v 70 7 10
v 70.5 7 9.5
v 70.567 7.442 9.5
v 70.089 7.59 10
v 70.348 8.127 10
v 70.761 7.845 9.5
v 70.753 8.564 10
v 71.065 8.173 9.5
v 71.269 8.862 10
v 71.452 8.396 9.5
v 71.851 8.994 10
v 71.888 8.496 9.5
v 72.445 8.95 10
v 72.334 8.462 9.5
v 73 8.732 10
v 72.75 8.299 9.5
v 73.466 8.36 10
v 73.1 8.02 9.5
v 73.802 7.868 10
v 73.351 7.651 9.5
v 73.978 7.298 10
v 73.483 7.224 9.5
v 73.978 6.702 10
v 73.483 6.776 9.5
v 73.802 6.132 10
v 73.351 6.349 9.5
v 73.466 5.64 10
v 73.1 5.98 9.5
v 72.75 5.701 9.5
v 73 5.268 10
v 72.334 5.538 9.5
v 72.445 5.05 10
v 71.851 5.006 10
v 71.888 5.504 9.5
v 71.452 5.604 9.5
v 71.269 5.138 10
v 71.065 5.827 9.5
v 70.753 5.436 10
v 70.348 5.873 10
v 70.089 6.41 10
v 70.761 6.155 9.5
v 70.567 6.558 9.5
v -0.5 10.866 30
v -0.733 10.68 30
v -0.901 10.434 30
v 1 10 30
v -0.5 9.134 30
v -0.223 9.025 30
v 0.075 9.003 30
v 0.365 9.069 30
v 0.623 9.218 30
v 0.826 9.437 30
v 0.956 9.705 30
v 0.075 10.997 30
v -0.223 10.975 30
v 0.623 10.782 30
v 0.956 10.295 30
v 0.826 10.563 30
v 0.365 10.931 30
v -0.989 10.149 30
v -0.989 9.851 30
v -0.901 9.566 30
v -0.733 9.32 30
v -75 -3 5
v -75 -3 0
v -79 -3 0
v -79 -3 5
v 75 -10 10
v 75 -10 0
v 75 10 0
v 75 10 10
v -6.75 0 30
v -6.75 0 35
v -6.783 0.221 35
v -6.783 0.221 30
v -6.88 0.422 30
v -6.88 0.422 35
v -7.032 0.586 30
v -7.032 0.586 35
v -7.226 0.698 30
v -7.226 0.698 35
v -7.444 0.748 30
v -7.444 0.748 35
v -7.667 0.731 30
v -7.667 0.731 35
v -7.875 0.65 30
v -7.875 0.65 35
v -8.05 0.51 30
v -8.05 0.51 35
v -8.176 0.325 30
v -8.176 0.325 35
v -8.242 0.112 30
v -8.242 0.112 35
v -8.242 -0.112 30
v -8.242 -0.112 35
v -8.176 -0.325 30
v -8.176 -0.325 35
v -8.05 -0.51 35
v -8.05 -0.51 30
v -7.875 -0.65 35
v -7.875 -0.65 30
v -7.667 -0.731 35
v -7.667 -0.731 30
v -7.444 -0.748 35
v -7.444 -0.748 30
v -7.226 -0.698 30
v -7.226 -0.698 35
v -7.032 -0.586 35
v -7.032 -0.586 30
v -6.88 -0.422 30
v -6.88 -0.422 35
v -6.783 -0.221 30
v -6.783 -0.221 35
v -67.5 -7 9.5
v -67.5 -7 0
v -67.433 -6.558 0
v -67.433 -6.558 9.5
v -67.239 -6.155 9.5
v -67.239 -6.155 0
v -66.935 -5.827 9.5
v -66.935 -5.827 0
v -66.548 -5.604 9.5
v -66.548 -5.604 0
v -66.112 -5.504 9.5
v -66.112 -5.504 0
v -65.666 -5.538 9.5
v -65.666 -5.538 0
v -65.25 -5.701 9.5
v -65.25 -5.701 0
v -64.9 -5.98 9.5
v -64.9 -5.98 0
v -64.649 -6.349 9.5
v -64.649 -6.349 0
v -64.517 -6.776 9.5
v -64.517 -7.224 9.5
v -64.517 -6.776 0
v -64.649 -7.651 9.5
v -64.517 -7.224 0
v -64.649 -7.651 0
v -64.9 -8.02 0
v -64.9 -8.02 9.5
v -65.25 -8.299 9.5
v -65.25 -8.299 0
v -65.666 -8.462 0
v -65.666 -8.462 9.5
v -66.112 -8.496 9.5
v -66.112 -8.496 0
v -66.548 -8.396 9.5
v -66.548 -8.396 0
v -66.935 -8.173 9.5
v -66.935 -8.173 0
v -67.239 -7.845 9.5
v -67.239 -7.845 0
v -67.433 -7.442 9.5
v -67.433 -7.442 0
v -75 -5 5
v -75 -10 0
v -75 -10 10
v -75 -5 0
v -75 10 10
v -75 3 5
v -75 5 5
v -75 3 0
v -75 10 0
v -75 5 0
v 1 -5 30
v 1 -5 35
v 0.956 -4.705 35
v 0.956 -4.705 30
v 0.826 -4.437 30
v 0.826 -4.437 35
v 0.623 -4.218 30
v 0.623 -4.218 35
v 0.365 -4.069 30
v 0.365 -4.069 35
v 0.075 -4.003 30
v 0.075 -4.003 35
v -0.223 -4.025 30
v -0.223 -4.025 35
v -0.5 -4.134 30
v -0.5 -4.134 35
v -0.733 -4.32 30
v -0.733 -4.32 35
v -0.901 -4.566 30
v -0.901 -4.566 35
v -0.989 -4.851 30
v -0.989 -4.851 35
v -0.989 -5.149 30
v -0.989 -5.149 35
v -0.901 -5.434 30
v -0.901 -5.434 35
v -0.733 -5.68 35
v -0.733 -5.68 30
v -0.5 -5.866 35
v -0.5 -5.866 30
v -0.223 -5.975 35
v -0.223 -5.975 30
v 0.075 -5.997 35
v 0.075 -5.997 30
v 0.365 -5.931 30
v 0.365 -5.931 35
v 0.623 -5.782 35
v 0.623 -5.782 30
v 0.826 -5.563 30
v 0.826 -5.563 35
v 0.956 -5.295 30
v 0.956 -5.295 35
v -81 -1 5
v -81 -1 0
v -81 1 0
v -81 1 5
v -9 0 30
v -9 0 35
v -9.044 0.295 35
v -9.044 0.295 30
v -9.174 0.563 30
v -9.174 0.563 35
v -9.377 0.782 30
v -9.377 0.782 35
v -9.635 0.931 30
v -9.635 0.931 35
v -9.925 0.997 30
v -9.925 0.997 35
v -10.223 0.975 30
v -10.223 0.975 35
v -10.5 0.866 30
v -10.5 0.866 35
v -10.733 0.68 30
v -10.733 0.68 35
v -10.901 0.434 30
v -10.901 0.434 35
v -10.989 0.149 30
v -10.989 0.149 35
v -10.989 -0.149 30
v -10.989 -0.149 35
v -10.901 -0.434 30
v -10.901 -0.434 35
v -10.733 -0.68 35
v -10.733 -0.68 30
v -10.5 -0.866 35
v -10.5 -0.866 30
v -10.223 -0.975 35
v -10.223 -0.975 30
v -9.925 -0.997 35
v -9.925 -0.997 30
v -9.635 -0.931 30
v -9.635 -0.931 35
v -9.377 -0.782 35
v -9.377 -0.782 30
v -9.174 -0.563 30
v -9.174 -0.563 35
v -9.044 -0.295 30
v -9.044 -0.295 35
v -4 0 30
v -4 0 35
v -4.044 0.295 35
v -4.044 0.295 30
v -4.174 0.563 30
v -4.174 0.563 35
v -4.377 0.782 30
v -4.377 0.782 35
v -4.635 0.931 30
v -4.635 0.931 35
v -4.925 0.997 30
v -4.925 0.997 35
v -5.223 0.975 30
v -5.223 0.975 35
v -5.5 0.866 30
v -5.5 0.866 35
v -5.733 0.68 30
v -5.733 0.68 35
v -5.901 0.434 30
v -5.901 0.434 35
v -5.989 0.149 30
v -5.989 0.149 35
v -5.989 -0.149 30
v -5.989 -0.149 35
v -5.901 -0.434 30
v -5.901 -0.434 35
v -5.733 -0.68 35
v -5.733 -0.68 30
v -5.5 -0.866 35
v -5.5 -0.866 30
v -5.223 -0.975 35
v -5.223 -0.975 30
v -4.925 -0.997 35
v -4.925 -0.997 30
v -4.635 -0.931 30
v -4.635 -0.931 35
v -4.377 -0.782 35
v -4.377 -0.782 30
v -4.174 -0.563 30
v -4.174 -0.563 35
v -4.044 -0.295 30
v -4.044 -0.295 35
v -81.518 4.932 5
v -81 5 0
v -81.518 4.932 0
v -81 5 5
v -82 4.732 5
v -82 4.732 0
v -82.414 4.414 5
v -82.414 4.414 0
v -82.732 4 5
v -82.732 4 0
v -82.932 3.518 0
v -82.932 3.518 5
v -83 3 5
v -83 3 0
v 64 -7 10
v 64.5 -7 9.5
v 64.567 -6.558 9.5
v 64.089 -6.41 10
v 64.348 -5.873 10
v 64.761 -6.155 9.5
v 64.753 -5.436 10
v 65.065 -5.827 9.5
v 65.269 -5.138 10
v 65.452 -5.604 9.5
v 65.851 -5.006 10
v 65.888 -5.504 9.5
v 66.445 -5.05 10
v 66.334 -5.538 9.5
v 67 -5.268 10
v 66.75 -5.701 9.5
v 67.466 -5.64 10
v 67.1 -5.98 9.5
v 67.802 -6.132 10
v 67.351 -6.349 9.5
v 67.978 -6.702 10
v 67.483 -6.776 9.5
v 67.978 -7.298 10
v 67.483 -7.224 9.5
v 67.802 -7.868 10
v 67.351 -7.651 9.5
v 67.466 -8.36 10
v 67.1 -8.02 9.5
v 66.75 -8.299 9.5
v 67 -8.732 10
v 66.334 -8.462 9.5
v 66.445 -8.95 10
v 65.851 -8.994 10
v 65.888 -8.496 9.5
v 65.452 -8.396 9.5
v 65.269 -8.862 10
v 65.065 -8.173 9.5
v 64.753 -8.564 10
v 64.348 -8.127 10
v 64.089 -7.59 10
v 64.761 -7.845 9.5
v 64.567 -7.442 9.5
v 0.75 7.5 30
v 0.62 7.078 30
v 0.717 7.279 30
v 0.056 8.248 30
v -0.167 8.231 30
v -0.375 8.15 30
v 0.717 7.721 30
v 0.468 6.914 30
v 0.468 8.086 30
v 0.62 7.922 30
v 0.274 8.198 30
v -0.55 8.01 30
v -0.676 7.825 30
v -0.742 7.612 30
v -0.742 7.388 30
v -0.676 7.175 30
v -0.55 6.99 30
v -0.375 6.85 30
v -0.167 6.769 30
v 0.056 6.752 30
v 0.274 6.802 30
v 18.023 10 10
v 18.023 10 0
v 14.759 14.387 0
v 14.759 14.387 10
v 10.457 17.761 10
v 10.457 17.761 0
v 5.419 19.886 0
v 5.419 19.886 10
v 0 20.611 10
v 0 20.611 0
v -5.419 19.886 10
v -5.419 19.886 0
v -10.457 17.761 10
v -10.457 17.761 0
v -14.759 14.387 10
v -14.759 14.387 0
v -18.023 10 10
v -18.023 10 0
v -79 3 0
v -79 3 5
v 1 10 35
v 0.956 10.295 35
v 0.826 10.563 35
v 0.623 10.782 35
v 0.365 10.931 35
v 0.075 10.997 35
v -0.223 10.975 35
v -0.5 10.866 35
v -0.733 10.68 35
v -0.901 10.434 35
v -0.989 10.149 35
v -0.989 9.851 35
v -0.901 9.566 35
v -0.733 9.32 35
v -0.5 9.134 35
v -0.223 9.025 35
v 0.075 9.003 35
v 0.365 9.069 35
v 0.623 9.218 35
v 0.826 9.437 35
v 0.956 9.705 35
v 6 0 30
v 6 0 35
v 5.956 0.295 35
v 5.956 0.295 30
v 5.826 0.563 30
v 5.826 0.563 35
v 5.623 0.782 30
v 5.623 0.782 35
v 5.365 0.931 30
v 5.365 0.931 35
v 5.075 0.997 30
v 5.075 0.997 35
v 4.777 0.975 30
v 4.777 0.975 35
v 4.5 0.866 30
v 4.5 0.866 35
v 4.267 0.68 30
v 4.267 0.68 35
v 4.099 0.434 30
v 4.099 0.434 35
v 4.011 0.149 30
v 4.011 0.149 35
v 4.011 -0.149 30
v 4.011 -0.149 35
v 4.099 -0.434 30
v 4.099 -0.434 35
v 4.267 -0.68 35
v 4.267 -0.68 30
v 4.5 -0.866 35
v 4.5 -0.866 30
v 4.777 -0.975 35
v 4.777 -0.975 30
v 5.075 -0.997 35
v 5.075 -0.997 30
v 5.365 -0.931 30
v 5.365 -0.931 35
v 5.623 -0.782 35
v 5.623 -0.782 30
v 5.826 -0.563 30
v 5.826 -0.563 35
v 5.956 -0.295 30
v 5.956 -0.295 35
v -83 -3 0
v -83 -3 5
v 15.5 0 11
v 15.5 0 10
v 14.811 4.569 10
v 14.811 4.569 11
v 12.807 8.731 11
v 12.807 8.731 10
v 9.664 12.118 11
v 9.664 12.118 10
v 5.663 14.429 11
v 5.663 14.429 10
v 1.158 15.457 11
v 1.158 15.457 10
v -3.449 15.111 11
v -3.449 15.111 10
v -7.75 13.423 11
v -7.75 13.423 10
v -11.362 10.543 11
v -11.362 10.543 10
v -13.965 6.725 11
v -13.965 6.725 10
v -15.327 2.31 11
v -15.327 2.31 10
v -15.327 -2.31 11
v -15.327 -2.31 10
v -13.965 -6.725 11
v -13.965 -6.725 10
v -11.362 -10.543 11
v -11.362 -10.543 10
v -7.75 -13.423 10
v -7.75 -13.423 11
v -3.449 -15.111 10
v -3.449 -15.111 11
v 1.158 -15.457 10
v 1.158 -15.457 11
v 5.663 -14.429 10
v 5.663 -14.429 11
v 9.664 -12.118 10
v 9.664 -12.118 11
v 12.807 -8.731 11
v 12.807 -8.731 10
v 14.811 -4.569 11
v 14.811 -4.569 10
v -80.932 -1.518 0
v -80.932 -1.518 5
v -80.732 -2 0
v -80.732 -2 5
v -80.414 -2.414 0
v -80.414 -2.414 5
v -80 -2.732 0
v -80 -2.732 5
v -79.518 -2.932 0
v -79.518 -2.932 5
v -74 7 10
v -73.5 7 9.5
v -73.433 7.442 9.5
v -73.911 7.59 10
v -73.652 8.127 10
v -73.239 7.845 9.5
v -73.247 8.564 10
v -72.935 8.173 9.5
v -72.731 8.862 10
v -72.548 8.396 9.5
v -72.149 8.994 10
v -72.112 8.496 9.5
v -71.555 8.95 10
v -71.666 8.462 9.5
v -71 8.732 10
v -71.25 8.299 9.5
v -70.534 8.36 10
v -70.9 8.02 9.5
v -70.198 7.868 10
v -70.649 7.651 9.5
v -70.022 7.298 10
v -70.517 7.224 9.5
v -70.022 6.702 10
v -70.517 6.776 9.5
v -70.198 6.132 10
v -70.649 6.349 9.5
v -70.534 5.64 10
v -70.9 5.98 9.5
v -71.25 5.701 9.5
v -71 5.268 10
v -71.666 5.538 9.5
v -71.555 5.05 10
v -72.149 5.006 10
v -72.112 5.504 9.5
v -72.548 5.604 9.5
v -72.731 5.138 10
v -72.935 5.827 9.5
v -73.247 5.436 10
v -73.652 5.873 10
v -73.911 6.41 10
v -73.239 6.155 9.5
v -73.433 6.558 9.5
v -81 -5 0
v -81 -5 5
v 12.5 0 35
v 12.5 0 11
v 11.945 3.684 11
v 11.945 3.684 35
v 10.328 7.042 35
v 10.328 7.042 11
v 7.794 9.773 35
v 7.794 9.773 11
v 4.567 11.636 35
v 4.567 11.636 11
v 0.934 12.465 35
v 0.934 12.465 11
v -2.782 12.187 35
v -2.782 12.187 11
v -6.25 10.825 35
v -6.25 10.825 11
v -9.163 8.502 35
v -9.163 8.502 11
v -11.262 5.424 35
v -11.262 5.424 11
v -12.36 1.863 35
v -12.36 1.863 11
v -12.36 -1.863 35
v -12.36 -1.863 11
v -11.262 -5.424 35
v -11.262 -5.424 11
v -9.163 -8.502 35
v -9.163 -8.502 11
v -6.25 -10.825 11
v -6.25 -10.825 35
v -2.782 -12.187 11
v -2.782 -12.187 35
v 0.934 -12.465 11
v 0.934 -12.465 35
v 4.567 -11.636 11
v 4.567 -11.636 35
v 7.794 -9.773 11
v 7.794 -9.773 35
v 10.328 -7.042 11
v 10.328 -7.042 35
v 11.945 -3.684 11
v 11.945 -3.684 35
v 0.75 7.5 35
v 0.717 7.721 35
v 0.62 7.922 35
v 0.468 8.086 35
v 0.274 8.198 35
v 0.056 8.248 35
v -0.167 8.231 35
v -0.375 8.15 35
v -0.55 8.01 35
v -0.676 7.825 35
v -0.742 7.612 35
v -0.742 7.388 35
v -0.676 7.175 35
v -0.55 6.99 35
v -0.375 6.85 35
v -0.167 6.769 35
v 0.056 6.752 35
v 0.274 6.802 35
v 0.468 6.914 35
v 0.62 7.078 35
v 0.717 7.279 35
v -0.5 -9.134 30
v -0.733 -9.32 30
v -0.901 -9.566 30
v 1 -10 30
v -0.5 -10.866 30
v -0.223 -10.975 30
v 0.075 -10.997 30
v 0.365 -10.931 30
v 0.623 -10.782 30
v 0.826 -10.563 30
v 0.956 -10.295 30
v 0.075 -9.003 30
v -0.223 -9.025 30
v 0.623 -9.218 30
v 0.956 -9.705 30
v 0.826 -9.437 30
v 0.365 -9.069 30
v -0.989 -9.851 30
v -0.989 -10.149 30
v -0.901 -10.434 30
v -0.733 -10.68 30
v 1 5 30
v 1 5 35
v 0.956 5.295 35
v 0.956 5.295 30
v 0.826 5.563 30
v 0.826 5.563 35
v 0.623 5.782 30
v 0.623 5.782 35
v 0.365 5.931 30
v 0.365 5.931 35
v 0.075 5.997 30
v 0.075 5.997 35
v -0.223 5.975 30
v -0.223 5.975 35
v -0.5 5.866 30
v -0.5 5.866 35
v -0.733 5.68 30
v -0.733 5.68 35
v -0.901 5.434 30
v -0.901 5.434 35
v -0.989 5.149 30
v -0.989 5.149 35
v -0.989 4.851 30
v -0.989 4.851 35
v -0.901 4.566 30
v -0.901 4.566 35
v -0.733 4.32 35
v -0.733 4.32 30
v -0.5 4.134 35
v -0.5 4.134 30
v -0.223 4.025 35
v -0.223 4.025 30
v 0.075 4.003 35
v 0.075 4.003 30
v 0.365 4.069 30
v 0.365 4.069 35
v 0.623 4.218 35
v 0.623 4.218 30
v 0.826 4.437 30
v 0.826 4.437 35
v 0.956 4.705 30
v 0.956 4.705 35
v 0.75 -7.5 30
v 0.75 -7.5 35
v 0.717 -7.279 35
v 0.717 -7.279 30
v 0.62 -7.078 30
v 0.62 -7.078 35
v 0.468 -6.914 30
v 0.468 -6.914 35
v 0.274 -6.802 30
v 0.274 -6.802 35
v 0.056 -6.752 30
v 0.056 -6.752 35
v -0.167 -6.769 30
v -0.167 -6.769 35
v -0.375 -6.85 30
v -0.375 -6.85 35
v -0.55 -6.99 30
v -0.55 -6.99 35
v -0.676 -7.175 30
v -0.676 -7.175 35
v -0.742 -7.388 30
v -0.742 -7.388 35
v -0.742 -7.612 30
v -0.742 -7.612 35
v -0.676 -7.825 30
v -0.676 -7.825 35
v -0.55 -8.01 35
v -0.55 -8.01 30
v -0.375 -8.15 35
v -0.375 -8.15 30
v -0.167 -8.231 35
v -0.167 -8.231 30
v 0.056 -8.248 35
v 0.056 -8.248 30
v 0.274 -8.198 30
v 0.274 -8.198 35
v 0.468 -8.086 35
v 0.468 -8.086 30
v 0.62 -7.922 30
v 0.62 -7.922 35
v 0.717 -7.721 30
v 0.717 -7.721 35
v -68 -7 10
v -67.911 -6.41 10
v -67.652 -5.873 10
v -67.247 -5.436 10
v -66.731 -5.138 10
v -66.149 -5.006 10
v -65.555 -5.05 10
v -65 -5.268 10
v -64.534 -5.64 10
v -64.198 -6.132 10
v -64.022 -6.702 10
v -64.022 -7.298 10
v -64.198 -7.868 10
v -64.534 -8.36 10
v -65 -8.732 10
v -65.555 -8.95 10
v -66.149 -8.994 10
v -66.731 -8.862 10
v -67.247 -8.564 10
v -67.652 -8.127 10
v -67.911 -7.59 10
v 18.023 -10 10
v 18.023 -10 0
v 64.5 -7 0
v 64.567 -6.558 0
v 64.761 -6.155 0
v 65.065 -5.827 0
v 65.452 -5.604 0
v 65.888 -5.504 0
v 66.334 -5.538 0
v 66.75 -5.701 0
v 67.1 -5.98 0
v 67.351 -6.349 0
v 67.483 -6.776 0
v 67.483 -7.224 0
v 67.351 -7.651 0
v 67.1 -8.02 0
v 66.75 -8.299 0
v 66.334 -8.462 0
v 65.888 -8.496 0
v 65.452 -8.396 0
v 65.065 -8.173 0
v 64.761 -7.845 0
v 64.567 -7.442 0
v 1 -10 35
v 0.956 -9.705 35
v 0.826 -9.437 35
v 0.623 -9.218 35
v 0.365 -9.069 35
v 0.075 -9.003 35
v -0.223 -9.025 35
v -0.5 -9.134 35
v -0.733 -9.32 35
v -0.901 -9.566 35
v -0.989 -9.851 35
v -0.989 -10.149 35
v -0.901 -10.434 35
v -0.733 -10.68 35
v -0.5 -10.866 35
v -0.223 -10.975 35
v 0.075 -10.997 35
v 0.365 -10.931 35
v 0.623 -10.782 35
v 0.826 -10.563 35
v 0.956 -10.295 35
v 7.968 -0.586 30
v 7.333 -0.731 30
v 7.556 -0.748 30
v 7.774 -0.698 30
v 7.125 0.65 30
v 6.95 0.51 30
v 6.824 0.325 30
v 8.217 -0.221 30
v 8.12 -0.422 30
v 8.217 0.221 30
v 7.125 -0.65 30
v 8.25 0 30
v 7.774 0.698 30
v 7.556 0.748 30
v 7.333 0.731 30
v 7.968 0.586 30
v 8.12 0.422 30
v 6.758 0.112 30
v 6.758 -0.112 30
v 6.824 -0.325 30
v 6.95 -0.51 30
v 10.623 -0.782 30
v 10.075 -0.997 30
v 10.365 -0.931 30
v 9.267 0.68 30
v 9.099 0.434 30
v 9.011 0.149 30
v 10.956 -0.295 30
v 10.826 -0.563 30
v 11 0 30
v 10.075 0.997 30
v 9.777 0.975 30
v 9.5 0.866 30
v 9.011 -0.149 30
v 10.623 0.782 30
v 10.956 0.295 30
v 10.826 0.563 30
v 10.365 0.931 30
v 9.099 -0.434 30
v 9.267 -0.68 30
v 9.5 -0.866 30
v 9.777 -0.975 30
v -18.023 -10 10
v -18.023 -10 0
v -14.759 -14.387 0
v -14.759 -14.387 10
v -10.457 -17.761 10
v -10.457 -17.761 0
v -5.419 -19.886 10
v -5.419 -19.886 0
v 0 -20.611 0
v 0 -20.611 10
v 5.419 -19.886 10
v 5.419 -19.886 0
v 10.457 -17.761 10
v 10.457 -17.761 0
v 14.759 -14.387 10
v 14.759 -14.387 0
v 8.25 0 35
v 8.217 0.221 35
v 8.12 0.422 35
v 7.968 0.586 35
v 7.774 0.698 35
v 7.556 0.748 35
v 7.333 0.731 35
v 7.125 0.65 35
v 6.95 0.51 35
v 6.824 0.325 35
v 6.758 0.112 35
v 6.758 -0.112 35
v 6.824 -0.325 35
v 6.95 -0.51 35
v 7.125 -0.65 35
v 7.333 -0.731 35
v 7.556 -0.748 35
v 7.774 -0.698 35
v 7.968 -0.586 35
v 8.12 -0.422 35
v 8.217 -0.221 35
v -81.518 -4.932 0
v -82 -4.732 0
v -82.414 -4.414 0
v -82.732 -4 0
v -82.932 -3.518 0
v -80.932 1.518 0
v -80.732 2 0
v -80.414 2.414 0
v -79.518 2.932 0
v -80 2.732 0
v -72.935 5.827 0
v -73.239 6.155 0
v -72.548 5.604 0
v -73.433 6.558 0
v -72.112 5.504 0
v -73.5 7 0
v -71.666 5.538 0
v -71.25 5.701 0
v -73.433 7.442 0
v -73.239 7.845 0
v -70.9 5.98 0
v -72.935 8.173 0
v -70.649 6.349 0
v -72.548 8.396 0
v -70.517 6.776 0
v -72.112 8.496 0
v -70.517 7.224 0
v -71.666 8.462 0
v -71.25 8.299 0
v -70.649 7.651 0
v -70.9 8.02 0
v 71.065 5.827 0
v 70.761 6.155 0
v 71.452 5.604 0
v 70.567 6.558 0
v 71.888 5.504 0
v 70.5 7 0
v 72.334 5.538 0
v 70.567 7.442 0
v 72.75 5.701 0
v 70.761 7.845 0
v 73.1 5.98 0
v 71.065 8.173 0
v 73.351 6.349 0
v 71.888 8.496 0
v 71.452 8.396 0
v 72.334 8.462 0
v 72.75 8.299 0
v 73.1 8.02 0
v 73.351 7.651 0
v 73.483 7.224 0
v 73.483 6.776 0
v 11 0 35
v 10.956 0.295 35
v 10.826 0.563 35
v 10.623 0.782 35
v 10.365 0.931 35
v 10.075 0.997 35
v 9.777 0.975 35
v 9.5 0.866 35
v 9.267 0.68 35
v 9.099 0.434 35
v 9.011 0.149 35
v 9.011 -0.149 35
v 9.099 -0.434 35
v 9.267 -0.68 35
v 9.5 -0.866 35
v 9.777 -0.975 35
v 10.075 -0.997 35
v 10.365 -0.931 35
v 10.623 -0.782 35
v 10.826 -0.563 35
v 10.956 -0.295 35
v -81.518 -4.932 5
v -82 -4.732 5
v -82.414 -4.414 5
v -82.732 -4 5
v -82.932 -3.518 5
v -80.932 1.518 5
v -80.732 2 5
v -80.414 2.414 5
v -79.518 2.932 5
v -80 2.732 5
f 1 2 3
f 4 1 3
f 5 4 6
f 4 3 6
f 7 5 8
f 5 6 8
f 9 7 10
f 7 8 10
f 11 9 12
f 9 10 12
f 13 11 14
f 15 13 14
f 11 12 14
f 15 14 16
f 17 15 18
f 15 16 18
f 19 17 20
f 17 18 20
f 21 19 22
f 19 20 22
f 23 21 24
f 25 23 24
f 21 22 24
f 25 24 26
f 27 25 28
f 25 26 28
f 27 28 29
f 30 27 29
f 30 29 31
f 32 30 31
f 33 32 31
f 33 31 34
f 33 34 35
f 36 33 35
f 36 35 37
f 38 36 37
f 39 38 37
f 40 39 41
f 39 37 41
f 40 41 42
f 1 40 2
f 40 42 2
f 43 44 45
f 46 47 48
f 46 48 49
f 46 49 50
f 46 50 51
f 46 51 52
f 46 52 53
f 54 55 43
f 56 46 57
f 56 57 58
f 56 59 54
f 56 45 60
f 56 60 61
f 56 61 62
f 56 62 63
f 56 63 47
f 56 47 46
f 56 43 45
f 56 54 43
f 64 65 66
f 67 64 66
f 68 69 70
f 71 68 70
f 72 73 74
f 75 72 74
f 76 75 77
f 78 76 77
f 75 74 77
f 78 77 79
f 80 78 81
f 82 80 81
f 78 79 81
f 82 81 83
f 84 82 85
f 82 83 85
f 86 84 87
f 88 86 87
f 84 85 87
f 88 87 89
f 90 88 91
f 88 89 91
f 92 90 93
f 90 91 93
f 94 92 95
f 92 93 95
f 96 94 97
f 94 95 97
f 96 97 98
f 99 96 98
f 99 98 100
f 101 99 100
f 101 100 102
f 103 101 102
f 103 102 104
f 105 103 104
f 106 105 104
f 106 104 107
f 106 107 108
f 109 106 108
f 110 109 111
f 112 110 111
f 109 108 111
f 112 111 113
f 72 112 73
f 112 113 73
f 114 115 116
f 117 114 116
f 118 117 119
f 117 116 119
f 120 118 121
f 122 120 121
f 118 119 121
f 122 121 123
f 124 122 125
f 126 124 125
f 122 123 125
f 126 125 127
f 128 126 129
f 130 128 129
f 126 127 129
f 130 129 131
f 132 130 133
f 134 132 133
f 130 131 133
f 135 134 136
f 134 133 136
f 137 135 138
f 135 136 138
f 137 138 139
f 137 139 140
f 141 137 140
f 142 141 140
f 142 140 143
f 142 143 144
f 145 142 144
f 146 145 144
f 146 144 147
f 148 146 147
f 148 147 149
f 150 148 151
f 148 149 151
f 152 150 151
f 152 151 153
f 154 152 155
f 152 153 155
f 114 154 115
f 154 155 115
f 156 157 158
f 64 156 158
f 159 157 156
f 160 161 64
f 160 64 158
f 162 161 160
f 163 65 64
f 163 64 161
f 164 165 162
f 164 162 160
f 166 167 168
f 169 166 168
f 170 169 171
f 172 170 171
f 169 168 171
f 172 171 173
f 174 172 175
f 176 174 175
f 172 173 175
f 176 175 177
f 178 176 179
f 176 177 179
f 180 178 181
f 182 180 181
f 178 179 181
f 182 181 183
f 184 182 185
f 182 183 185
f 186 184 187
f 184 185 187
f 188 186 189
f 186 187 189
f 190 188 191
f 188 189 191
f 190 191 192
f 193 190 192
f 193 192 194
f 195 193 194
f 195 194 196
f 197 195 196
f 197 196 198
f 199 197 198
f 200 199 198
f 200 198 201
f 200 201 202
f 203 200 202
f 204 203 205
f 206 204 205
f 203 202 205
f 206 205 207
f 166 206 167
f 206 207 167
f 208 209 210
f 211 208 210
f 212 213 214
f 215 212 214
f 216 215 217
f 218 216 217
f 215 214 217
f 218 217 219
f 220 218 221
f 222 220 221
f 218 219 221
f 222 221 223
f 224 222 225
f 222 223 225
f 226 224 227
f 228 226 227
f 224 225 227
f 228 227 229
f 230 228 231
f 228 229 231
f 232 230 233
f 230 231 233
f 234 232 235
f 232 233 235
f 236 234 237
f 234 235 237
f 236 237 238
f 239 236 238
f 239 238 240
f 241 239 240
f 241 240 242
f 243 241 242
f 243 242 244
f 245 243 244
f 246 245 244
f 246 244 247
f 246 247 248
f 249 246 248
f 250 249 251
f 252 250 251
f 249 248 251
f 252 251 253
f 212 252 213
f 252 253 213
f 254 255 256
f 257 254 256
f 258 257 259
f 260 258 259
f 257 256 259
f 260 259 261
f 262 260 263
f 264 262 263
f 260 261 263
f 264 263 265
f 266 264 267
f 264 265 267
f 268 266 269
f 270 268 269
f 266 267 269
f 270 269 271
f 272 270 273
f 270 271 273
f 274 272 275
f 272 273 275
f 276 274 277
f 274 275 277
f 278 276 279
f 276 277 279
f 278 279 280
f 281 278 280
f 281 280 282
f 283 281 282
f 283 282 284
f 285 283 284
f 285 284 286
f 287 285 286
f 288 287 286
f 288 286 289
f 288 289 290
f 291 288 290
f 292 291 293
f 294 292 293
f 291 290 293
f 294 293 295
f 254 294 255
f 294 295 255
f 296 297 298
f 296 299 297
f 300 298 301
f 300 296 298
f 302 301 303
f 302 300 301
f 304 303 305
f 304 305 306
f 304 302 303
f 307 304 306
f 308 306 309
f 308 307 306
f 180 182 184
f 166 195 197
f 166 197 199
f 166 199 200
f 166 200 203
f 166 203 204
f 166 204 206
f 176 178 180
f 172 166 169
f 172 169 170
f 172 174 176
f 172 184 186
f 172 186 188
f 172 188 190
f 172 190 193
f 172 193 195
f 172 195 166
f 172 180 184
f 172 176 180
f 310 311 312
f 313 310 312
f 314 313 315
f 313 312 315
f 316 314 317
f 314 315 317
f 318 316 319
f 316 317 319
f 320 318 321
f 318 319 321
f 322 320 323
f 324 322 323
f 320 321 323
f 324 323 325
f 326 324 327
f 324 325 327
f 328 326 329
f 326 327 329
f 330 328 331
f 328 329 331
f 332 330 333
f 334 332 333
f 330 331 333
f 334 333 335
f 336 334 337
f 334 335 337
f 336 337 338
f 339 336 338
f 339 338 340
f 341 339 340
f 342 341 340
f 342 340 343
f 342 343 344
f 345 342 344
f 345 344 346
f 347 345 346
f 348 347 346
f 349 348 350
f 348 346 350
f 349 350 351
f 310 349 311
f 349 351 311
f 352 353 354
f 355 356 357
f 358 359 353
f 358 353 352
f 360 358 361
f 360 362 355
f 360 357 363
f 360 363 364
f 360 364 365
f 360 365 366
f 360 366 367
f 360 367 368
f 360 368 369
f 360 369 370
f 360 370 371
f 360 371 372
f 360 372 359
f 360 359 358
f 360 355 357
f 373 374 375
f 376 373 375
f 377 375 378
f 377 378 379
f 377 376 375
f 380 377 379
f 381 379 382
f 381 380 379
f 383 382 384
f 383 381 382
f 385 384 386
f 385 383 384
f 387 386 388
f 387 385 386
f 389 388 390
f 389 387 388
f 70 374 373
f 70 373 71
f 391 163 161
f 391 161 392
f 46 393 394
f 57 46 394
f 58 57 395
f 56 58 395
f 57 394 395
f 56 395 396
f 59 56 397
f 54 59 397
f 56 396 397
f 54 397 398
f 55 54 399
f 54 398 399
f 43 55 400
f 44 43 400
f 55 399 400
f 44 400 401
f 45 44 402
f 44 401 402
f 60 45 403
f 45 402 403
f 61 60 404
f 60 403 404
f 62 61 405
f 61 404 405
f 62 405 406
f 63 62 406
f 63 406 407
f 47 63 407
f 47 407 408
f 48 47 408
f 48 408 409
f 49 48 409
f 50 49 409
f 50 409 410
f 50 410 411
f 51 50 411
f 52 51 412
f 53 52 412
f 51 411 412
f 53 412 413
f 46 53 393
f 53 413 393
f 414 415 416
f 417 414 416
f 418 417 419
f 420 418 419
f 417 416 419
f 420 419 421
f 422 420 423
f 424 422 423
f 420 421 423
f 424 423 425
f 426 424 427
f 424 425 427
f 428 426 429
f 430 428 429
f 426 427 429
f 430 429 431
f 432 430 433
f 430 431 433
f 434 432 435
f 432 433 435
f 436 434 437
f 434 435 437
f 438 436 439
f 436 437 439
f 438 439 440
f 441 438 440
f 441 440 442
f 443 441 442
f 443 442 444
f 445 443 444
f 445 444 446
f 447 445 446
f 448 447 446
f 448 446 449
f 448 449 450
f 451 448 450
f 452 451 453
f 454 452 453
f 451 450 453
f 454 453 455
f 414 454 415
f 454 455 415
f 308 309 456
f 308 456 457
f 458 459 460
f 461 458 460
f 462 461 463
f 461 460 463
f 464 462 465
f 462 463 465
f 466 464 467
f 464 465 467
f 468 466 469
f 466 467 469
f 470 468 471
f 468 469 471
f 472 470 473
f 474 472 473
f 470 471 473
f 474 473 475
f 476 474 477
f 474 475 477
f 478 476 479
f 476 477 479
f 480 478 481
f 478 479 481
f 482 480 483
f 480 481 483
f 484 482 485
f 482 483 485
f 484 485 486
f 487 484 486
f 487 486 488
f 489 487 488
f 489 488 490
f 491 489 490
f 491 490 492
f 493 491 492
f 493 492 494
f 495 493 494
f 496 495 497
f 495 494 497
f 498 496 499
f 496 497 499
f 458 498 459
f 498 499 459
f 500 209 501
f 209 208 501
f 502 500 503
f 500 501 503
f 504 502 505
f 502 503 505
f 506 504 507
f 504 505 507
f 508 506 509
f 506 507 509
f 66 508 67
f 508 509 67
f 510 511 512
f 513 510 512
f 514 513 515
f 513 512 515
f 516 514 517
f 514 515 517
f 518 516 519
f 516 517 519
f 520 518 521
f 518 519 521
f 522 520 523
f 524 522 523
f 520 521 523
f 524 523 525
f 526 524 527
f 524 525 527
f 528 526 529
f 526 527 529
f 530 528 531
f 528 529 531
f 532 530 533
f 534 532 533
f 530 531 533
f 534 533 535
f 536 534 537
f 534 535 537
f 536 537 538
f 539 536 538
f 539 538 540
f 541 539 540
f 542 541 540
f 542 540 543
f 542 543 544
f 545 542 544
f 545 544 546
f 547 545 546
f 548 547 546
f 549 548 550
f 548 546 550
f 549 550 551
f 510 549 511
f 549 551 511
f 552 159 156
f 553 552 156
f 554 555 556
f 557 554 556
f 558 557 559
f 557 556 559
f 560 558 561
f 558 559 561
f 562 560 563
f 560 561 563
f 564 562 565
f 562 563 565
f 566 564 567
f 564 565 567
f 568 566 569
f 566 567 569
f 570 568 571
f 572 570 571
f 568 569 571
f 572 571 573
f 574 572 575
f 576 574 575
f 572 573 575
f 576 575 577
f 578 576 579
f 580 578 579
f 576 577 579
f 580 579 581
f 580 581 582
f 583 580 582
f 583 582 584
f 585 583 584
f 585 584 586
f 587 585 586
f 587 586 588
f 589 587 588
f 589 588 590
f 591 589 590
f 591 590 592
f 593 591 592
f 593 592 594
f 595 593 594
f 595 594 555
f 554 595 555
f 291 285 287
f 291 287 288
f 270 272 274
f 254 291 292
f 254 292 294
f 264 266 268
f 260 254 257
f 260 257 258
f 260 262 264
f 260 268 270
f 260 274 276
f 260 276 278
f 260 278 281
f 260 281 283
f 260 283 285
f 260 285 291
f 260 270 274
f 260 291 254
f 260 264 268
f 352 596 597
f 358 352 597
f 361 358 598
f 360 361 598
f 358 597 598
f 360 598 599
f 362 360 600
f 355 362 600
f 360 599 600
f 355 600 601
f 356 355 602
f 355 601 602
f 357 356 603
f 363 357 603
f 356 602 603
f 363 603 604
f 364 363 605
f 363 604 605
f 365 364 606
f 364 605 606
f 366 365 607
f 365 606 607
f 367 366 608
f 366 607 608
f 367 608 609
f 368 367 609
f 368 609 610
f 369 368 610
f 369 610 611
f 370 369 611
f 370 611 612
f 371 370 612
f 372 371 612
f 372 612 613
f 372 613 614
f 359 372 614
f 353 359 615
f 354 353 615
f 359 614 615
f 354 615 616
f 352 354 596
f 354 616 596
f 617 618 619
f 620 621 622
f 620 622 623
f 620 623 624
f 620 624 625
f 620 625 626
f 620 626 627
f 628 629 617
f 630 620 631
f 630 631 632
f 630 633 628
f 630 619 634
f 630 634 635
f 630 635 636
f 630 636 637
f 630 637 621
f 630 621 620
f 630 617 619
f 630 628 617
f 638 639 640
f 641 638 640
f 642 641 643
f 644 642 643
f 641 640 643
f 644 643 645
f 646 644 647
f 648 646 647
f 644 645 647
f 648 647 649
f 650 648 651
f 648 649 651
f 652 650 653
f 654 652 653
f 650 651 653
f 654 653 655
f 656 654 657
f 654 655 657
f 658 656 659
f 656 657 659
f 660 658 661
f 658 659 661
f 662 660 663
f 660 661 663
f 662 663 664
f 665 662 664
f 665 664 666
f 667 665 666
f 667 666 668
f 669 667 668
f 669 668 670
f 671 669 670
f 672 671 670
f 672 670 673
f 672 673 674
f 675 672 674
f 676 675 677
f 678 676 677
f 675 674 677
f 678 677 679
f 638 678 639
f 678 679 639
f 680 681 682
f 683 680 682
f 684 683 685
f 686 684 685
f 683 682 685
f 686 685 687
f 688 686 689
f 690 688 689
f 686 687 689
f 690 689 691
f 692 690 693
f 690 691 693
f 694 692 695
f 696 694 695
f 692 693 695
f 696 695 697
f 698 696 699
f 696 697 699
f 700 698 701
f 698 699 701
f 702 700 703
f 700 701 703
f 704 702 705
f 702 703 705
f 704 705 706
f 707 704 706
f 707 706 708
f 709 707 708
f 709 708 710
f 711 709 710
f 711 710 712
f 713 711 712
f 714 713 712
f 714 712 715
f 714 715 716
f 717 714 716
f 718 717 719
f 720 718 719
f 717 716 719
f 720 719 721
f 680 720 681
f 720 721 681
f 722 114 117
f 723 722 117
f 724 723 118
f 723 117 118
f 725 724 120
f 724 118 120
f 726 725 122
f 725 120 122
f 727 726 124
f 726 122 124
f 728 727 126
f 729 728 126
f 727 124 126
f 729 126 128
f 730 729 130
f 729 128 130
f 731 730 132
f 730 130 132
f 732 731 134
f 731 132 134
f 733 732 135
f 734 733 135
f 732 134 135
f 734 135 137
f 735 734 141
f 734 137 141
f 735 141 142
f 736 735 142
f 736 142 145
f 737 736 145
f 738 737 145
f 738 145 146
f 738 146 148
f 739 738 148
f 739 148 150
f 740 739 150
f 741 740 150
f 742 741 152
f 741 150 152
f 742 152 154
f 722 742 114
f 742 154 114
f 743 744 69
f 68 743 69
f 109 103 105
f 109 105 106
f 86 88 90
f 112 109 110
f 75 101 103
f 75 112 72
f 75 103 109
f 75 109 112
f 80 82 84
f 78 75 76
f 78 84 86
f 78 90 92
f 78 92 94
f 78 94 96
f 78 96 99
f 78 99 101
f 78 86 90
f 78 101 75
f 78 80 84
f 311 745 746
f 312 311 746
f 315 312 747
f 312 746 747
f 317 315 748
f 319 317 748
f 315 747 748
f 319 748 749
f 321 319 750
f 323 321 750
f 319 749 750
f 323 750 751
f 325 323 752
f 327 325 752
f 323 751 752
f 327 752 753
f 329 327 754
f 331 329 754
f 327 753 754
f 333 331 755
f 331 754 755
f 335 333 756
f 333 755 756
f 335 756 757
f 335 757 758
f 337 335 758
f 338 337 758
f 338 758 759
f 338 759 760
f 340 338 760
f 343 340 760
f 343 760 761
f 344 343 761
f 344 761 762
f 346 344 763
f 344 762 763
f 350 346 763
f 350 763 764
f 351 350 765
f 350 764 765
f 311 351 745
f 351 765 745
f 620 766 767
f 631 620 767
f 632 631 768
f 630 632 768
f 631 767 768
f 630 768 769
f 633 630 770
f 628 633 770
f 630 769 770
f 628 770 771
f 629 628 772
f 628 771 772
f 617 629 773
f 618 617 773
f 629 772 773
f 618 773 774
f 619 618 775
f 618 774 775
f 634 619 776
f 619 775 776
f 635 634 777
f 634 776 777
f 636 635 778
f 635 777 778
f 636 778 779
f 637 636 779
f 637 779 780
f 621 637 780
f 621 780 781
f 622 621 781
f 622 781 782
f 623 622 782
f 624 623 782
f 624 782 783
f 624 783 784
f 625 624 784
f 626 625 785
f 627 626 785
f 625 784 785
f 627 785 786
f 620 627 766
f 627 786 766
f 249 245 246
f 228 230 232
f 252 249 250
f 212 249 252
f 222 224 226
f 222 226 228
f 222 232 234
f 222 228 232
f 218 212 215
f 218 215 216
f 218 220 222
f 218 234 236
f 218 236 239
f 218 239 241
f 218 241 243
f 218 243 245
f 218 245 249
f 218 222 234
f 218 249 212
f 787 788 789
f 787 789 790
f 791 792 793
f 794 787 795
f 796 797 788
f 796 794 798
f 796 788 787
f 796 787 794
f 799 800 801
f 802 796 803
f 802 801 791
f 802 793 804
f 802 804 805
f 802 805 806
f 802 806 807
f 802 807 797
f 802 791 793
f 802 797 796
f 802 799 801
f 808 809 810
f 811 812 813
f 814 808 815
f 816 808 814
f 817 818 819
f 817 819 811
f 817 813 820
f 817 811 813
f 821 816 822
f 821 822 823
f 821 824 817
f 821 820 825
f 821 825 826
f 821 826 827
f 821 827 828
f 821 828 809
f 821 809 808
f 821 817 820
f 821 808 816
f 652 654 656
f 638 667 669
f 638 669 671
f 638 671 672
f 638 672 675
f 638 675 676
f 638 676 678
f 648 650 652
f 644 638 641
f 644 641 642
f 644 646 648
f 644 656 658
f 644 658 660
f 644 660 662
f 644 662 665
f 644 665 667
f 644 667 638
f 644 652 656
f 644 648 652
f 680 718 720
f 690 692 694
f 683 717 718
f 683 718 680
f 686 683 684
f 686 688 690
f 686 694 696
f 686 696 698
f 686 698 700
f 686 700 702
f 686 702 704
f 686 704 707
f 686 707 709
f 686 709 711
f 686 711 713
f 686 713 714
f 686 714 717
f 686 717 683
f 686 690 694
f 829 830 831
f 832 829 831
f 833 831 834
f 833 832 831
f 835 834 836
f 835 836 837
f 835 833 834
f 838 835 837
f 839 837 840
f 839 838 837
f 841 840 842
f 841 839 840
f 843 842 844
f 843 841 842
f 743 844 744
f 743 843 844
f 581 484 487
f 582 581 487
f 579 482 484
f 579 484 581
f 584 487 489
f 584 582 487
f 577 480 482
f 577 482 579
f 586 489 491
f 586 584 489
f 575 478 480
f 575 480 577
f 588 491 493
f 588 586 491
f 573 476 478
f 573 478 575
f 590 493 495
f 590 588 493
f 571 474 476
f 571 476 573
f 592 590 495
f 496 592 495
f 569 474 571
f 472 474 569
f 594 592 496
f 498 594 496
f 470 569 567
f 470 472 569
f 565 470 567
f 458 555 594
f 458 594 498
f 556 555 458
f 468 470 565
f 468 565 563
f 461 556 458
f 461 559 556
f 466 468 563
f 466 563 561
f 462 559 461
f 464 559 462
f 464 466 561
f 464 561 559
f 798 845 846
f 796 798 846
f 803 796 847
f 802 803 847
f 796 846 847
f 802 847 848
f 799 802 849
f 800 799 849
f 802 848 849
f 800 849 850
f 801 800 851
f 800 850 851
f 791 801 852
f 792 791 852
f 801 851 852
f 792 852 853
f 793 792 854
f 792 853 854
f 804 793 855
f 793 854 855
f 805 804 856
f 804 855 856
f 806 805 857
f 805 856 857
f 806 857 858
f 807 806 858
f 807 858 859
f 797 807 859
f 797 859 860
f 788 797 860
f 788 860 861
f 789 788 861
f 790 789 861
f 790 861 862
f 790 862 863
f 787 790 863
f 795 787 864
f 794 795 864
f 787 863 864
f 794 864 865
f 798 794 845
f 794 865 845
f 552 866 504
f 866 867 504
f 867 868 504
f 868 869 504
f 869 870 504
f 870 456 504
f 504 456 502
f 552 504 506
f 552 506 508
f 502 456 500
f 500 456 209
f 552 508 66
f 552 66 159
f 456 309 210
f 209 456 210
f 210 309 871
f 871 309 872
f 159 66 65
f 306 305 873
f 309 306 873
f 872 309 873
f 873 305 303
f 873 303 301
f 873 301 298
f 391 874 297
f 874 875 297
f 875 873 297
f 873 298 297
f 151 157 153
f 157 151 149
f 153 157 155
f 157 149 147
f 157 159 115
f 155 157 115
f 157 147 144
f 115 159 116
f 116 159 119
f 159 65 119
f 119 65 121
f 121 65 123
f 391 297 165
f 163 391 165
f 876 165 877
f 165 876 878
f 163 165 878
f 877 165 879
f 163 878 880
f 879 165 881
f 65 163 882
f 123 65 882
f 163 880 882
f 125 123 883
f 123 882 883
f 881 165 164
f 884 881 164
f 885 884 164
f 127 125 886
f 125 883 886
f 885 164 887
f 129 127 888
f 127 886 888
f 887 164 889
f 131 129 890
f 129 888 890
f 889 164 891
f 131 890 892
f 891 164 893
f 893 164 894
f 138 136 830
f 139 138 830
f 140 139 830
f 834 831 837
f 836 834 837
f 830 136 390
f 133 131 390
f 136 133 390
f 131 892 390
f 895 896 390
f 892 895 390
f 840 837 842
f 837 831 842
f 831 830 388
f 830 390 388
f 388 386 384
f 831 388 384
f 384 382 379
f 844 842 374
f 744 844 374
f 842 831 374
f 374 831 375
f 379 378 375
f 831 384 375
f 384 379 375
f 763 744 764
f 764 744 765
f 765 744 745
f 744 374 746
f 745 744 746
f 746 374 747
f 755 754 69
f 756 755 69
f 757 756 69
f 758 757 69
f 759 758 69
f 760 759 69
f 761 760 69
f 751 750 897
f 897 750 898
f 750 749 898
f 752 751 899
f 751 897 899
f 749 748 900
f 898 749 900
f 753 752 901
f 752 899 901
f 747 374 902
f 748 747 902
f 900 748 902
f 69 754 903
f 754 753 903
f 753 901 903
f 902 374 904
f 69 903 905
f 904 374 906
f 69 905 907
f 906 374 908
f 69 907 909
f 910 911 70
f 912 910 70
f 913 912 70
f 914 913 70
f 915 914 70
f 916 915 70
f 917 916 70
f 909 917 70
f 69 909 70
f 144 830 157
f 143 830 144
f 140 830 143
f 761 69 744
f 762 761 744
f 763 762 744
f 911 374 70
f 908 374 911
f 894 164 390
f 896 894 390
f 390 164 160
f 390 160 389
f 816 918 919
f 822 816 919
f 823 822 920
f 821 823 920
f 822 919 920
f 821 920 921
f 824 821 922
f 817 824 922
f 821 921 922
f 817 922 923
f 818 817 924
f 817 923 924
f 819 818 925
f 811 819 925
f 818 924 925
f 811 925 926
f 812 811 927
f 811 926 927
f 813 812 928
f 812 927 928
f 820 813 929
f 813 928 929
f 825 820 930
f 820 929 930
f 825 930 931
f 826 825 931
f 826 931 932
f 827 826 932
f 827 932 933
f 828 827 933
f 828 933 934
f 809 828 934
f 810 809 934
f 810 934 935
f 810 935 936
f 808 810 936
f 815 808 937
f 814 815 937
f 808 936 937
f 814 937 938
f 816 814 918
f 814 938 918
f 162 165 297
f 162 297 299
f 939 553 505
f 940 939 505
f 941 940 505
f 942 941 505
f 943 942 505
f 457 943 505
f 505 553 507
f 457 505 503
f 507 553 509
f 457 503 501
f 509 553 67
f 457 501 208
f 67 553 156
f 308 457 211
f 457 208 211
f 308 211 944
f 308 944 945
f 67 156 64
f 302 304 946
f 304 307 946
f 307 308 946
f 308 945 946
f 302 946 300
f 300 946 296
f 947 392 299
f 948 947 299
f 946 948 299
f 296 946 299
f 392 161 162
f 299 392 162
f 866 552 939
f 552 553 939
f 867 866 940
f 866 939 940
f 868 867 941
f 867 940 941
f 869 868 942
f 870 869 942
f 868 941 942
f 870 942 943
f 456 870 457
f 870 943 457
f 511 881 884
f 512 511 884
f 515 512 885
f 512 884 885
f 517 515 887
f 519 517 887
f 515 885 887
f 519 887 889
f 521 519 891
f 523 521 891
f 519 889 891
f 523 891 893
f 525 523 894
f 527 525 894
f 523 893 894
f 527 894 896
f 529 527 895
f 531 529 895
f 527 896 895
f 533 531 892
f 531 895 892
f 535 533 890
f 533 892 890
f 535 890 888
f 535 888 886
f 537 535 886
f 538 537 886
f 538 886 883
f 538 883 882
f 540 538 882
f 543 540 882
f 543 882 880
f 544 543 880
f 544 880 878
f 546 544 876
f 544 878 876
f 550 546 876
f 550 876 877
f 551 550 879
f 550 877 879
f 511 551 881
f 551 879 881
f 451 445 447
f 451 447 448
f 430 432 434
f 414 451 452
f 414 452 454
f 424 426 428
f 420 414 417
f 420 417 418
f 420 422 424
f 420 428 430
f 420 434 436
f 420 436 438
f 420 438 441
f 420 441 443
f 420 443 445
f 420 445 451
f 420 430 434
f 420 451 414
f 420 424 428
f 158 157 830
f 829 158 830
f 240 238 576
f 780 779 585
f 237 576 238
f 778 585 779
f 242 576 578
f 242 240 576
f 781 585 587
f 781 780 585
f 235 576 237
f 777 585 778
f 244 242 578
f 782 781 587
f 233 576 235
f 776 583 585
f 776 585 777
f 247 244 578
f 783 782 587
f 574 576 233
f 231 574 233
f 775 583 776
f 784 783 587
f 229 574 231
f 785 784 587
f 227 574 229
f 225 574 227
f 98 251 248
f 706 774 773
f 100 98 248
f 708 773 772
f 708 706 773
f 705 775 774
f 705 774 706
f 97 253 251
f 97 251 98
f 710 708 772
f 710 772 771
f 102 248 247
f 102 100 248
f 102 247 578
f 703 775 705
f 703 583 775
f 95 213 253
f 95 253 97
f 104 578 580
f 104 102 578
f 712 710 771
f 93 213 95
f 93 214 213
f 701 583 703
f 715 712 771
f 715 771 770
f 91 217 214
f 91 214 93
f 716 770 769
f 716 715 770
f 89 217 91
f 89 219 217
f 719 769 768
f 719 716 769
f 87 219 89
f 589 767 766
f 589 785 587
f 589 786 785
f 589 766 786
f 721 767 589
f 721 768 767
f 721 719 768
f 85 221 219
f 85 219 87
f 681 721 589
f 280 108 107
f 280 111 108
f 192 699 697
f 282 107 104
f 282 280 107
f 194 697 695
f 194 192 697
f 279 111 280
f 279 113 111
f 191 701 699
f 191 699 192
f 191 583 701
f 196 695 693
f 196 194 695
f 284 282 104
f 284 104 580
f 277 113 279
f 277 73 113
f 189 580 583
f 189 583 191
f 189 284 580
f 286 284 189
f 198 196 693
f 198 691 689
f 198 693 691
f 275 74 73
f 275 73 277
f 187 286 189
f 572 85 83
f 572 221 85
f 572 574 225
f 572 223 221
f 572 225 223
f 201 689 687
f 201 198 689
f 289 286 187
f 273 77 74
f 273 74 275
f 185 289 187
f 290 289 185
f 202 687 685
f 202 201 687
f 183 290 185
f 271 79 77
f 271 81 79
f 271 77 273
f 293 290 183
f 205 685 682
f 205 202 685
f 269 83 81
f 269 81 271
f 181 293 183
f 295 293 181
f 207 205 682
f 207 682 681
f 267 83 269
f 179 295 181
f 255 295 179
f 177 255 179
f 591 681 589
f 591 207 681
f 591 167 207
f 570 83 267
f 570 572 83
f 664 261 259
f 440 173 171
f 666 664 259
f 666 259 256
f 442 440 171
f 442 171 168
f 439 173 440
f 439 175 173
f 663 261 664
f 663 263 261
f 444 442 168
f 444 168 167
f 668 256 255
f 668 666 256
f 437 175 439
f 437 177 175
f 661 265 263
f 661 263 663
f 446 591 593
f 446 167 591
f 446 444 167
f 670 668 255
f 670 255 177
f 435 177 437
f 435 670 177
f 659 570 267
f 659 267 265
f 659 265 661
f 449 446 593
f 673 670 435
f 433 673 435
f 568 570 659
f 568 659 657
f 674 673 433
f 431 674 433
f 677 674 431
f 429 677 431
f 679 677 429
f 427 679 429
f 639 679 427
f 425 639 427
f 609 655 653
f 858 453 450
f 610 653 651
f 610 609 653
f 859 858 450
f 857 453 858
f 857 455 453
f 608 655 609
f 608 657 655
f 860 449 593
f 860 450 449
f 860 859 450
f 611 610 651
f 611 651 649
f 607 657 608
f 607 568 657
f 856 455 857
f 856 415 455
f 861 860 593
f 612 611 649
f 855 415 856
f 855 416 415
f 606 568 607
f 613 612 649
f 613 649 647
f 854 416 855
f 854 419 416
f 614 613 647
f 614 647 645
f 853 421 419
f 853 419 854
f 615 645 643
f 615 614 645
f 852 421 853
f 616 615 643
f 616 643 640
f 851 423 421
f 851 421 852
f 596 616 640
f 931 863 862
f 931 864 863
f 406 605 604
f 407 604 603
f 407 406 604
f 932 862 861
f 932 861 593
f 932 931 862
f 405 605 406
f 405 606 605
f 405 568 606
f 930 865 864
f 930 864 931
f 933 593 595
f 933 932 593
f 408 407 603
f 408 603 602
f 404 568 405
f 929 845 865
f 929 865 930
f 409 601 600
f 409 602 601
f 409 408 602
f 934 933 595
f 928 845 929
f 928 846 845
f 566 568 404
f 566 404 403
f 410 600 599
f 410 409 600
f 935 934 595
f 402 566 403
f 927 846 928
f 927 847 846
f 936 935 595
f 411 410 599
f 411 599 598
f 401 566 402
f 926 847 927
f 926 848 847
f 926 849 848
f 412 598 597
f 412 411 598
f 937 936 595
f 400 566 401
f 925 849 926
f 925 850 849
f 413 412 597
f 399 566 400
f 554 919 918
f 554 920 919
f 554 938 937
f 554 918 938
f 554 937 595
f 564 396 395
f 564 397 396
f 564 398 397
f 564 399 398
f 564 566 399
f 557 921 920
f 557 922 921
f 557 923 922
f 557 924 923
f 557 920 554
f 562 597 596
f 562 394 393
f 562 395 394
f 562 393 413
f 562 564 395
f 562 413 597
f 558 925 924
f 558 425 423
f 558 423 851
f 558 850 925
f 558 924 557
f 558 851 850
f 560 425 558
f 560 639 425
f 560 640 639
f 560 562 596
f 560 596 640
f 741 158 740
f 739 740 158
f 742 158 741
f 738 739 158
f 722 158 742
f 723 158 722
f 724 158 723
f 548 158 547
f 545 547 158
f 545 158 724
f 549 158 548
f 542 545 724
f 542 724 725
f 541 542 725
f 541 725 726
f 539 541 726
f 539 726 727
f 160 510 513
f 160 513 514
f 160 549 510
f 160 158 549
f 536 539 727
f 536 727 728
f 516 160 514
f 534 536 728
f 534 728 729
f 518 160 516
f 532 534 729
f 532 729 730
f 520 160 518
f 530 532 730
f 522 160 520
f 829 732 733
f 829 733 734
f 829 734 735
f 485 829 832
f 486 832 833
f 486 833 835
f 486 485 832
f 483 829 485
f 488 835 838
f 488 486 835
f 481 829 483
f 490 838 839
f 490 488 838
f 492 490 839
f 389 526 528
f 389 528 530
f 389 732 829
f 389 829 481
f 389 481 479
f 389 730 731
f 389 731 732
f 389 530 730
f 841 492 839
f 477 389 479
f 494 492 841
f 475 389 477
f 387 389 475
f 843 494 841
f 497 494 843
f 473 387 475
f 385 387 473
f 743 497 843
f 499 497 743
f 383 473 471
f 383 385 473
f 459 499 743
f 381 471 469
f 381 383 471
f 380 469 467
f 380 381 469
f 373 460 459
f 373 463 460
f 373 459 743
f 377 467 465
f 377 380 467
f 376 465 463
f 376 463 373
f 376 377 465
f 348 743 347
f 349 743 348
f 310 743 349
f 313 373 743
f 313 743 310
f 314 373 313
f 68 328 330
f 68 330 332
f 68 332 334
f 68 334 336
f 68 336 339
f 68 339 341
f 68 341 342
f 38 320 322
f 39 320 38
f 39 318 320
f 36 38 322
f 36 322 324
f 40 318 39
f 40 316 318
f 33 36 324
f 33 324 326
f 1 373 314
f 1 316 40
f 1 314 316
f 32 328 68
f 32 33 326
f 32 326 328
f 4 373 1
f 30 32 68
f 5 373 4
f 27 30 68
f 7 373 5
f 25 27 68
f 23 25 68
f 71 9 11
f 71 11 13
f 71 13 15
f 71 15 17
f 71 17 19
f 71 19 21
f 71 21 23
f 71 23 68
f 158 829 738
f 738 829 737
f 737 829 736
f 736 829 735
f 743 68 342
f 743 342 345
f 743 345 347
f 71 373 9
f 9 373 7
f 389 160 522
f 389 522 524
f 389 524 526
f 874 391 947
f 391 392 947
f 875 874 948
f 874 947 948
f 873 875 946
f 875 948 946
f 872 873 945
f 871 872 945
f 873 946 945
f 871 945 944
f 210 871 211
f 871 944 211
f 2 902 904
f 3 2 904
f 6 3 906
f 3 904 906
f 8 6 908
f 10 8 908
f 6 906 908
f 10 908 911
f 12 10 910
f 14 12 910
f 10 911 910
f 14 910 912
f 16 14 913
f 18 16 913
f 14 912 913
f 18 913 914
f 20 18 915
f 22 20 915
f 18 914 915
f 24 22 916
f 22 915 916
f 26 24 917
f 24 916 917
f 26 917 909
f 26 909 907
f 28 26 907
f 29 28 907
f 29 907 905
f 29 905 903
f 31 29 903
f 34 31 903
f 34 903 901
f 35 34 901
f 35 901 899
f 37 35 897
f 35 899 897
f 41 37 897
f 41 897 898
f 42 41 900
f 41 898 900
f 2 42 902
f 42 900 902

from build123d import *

# Parameters (mm, degrees)
SZKIC1_W                    = 150
SZKIC1_H                    = 20
DODANIE_WYCI_GNI_CIE1_DEPTH = 10
SZKIC2_R                    = 20.61119484
DODANIE_WYCI_GNI_CIE2_DEPTH = 10
SZKIC3_R                    = 12.5
DODANIE_WYCI_GNI_CIE5_DEPTH = 25
SZKIC8_R                    = 15.5
DODANIE_WYCI_GNI_CIE6_DEPTH = 1
SZKIC9_R                    = 1.5
WYTNIJ_WYCI_GNI_CIE1_DEPTH  = 10
SFAZOWANIE1_SIZE            = 0.5
SZKIC10_W                   = 5
SZKIC10_H                   = 10
DODANIE_WYCI_GNI_CIE7_DEPTH = 8
SZKIC11_W                   = 6
SZKIC11_H                   = 6
WYTNIJ_WYCI_GNI_CIE2_DEPTH  = 8
ZAOKR_GLENIE1_R             = 2
SZKIC12_R                   = 1
SZKIC12_R_2                 = 0.75
WYTNIJ_WYCI_GNI_CIE3_DEPTH  = 5


with BuildPart() as part:
    # Szkic1 → Dodanie-wyciągnięcie1 (new body)
    with BuildSketch(Plane.XY):
        Rectangle(SZKIC1_W, SZKIC1_H)
    extrude(amount=DODANIE_WYCI_GNI_CIE1_DEPTH)

    # Szkic2 → Dodanie-wyciągnięcie2 (add)
    with BuildSketch(Plane.XY.offset(10)):
        Circle(SZKIC2_R)
    extrude(amount=-DODANIE_WYCI_GNI_CIE2_DEPTH)

    # Szkic3 → Dodanie-wyciągnięcie5 (add)
    with BuildSketch(Plane.XY.offset(10)):
        Circle(SZKIC3_R)
    extrude(amount=DODANIE_WYCI_GNI_CIE5_DEPTH)

    # Szkic8 → Dodanie-wyciągnięcie6 (add)
    with BuildSketch(Plane.XY.offset(10)):
        Circle(SZKIC8_R)
    extrude(amount=DODANIE_WYCI_GNI_CIE6_DEPTH)

    # Szkic9 → Wytnij-wyciągnięcie1 (cut)
    with BuildSketch(Plane(origin=(0, 0, 0), x_dir=(-1, 0, 0), z_dir=(0, 0, -1))):
        with Locations((-72, 7)):
            Circle(SZKIC9_R)
        with Locations((-66, -7)):
            Circle(SZKIC9_R)
        with Locations((66, -7)):
            Circle(SZKIC9_R)
        with Locations((72, 7)):
            Circle(SZKIC9_R)
    extrude(amount=-WYTNIJ_WYCI_GNI_CIE1_DEPTH, mode=Mode.SUBTRACT)

    # Sfazowanie1
    sfazowanie1_edges = [part.edges().sort_by_distance(p)[0] for p in [
        (73.5, 7, 10),
        (67.5, -7, 10),
        (-64.5, -7, 10),
        (-70.5, 7, 10),
    ]]
    chamfer(sfazowanie1_edges, length=SFAZOWANIE1_SIZE)

    # Szkic10 → Dodanie-wyciągnięcie7 (add)
    with BuildSketch(Plane.ZY.offset(75)):
        with Locations((2.5, 0)):
            Rectangle(SZKIC10_W, SZKIC10_H)
    extrude(amount=DODANIE_WYCI_GNI_CIE7_DEPTH)

    # Szkic11 → Wytnij-wyciągnięcie2 (cut)
    with BuildSketch(Plane(origin=(0, 0, 0), x_dir=(-1, 0, 0), z_dir=(0, 0, -1))):
        with Locations((78, 0)):
            Rectangle(SZKIC11_W, SZKIC11_H)
    extrude(amount=-WYTNIJ_WYCI_GNI_CIE2_DEPTH, mode=Mode.SUBTRACT)

    # Zaokrąglenie1
    zaokr_glenie1_edges = [part.edges().sort_by_distance(p)[0] for p in [
        (-81, 3, 2.5),
        (-81, -3, 2.5),
        (-83, -5, 2.5),
        (-83, 5, 2.5),
    ]]
    fillet(zaokr_glenie1_edges, radius=ZAOKR_GLENIE1_R)

    # Szkic12 → Wytnij-wyciągnięcie3 (cut)
    with BuildSketch(Plane.XY.offset(35)):
        with Locations((-5, 0)):
            Circle(SZKIC12_R)
        with Locations((-10, 0)):
            Circle(SZKIC12_R)
        with Locations((0, 10)):
            Circle(SZKIC12_R)
        with Locations((0, 5)):
            Circle(SZKIC12_R)
        with Locations((10, 0)):
            Circle(SZKIC12_R)
        with Locations((5, 0)):
            Circle(SZKIC12_R)
        with Locations((0, -10)):
            Circle(SZKIC12_R)
        with Locations((0, -5)):
            Circle(SZKIC12_R)
        with Locations((-7.5, 0)):
            Circle(SZKIC12_R_2)
        with Locations((0, 7.5)):
            Circle(SZKIC12_R_2)
        with Locations((7.5, 0)):
            Circle(SZKIC12_R_2)
        with Locations((0, -7.5)):
            Circle(SZKIC12_R_2)
    extrude(amount=-WYTNIJ_WYCI_GNI_CIE3_DEPTH, mode=Mode.SUBTRACT)


solid = part.part
